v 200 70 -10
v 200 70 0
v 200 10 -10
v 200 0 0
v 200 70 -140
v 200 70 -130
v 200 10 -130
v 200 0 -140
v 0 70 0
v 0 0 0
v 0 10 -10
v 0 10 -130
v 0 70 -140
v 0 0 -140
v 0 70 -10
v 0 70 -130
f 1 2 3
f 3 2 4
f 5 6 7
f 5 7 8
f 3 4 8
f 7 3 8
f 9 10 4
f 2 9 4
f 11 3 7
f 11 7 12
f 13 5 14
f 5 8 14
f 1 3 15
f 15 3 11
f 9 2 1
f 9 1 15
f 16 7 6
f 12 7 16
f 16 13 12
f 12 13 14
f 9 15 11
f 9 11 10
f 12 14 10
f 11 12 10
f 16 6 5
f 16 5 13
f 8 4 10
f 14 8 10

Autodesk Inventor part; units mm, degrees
ref_plane "YZ Plane" through (0, 0, 0) normal (1, 0, 0) x (0, 1, 0)
ref_plane "XZ Plane" through (0, 0, 0) normal (0, 1, 0) x (-1, 0, 0)
ref_plane "XY Plane" through (0, 0, 0) normal (0, 0, 1) x (1, 0, 0)
sketch "Boceto1" plane through (0, 0, 0) normal (0, 1, 0) x (-1, 0, 0)
  line L0 (0, 0) -> (-200, 0)
  line L1 (-200, 0) -> (-200, -140)
  line L2 (-200, -140) -> (0, -140)
  line L3 (0, -140) -> (0, 0)
  line L4 (0, 0) -> (-200, 0)
  line L5 (-200, 0) -> (-200, -10)
  line L6 (-200, -10) -> (0, -10)
  line L7 (0, -10) -> (0, 0)
  line L8 (0, -140) -> (-200, -140)
  line L9 (-200, -140) -> (-200, -130)
  line L10 (-200, -130) -> (0, -130)
  line L11 (0, -130) -> (0, -140)
  dimension "d0" = 200
  dimension "d1" = 140
  dimension "d2" = 200
  dimension "d3" = 10
  dimension "d4" = 200
  dimension "d5" = 10
extrude "Extrusión1" add sketch "Boceto1" along normal blind 10 contours L3 L10 L1 L6
extrude "Extrusión2" add sketch "Boceto1" along normal blind 70 contours L3 L6 L1 L0 | L3 L2 L1 L10
properties part number "Soporte_rods" material "Acero, fundido"
